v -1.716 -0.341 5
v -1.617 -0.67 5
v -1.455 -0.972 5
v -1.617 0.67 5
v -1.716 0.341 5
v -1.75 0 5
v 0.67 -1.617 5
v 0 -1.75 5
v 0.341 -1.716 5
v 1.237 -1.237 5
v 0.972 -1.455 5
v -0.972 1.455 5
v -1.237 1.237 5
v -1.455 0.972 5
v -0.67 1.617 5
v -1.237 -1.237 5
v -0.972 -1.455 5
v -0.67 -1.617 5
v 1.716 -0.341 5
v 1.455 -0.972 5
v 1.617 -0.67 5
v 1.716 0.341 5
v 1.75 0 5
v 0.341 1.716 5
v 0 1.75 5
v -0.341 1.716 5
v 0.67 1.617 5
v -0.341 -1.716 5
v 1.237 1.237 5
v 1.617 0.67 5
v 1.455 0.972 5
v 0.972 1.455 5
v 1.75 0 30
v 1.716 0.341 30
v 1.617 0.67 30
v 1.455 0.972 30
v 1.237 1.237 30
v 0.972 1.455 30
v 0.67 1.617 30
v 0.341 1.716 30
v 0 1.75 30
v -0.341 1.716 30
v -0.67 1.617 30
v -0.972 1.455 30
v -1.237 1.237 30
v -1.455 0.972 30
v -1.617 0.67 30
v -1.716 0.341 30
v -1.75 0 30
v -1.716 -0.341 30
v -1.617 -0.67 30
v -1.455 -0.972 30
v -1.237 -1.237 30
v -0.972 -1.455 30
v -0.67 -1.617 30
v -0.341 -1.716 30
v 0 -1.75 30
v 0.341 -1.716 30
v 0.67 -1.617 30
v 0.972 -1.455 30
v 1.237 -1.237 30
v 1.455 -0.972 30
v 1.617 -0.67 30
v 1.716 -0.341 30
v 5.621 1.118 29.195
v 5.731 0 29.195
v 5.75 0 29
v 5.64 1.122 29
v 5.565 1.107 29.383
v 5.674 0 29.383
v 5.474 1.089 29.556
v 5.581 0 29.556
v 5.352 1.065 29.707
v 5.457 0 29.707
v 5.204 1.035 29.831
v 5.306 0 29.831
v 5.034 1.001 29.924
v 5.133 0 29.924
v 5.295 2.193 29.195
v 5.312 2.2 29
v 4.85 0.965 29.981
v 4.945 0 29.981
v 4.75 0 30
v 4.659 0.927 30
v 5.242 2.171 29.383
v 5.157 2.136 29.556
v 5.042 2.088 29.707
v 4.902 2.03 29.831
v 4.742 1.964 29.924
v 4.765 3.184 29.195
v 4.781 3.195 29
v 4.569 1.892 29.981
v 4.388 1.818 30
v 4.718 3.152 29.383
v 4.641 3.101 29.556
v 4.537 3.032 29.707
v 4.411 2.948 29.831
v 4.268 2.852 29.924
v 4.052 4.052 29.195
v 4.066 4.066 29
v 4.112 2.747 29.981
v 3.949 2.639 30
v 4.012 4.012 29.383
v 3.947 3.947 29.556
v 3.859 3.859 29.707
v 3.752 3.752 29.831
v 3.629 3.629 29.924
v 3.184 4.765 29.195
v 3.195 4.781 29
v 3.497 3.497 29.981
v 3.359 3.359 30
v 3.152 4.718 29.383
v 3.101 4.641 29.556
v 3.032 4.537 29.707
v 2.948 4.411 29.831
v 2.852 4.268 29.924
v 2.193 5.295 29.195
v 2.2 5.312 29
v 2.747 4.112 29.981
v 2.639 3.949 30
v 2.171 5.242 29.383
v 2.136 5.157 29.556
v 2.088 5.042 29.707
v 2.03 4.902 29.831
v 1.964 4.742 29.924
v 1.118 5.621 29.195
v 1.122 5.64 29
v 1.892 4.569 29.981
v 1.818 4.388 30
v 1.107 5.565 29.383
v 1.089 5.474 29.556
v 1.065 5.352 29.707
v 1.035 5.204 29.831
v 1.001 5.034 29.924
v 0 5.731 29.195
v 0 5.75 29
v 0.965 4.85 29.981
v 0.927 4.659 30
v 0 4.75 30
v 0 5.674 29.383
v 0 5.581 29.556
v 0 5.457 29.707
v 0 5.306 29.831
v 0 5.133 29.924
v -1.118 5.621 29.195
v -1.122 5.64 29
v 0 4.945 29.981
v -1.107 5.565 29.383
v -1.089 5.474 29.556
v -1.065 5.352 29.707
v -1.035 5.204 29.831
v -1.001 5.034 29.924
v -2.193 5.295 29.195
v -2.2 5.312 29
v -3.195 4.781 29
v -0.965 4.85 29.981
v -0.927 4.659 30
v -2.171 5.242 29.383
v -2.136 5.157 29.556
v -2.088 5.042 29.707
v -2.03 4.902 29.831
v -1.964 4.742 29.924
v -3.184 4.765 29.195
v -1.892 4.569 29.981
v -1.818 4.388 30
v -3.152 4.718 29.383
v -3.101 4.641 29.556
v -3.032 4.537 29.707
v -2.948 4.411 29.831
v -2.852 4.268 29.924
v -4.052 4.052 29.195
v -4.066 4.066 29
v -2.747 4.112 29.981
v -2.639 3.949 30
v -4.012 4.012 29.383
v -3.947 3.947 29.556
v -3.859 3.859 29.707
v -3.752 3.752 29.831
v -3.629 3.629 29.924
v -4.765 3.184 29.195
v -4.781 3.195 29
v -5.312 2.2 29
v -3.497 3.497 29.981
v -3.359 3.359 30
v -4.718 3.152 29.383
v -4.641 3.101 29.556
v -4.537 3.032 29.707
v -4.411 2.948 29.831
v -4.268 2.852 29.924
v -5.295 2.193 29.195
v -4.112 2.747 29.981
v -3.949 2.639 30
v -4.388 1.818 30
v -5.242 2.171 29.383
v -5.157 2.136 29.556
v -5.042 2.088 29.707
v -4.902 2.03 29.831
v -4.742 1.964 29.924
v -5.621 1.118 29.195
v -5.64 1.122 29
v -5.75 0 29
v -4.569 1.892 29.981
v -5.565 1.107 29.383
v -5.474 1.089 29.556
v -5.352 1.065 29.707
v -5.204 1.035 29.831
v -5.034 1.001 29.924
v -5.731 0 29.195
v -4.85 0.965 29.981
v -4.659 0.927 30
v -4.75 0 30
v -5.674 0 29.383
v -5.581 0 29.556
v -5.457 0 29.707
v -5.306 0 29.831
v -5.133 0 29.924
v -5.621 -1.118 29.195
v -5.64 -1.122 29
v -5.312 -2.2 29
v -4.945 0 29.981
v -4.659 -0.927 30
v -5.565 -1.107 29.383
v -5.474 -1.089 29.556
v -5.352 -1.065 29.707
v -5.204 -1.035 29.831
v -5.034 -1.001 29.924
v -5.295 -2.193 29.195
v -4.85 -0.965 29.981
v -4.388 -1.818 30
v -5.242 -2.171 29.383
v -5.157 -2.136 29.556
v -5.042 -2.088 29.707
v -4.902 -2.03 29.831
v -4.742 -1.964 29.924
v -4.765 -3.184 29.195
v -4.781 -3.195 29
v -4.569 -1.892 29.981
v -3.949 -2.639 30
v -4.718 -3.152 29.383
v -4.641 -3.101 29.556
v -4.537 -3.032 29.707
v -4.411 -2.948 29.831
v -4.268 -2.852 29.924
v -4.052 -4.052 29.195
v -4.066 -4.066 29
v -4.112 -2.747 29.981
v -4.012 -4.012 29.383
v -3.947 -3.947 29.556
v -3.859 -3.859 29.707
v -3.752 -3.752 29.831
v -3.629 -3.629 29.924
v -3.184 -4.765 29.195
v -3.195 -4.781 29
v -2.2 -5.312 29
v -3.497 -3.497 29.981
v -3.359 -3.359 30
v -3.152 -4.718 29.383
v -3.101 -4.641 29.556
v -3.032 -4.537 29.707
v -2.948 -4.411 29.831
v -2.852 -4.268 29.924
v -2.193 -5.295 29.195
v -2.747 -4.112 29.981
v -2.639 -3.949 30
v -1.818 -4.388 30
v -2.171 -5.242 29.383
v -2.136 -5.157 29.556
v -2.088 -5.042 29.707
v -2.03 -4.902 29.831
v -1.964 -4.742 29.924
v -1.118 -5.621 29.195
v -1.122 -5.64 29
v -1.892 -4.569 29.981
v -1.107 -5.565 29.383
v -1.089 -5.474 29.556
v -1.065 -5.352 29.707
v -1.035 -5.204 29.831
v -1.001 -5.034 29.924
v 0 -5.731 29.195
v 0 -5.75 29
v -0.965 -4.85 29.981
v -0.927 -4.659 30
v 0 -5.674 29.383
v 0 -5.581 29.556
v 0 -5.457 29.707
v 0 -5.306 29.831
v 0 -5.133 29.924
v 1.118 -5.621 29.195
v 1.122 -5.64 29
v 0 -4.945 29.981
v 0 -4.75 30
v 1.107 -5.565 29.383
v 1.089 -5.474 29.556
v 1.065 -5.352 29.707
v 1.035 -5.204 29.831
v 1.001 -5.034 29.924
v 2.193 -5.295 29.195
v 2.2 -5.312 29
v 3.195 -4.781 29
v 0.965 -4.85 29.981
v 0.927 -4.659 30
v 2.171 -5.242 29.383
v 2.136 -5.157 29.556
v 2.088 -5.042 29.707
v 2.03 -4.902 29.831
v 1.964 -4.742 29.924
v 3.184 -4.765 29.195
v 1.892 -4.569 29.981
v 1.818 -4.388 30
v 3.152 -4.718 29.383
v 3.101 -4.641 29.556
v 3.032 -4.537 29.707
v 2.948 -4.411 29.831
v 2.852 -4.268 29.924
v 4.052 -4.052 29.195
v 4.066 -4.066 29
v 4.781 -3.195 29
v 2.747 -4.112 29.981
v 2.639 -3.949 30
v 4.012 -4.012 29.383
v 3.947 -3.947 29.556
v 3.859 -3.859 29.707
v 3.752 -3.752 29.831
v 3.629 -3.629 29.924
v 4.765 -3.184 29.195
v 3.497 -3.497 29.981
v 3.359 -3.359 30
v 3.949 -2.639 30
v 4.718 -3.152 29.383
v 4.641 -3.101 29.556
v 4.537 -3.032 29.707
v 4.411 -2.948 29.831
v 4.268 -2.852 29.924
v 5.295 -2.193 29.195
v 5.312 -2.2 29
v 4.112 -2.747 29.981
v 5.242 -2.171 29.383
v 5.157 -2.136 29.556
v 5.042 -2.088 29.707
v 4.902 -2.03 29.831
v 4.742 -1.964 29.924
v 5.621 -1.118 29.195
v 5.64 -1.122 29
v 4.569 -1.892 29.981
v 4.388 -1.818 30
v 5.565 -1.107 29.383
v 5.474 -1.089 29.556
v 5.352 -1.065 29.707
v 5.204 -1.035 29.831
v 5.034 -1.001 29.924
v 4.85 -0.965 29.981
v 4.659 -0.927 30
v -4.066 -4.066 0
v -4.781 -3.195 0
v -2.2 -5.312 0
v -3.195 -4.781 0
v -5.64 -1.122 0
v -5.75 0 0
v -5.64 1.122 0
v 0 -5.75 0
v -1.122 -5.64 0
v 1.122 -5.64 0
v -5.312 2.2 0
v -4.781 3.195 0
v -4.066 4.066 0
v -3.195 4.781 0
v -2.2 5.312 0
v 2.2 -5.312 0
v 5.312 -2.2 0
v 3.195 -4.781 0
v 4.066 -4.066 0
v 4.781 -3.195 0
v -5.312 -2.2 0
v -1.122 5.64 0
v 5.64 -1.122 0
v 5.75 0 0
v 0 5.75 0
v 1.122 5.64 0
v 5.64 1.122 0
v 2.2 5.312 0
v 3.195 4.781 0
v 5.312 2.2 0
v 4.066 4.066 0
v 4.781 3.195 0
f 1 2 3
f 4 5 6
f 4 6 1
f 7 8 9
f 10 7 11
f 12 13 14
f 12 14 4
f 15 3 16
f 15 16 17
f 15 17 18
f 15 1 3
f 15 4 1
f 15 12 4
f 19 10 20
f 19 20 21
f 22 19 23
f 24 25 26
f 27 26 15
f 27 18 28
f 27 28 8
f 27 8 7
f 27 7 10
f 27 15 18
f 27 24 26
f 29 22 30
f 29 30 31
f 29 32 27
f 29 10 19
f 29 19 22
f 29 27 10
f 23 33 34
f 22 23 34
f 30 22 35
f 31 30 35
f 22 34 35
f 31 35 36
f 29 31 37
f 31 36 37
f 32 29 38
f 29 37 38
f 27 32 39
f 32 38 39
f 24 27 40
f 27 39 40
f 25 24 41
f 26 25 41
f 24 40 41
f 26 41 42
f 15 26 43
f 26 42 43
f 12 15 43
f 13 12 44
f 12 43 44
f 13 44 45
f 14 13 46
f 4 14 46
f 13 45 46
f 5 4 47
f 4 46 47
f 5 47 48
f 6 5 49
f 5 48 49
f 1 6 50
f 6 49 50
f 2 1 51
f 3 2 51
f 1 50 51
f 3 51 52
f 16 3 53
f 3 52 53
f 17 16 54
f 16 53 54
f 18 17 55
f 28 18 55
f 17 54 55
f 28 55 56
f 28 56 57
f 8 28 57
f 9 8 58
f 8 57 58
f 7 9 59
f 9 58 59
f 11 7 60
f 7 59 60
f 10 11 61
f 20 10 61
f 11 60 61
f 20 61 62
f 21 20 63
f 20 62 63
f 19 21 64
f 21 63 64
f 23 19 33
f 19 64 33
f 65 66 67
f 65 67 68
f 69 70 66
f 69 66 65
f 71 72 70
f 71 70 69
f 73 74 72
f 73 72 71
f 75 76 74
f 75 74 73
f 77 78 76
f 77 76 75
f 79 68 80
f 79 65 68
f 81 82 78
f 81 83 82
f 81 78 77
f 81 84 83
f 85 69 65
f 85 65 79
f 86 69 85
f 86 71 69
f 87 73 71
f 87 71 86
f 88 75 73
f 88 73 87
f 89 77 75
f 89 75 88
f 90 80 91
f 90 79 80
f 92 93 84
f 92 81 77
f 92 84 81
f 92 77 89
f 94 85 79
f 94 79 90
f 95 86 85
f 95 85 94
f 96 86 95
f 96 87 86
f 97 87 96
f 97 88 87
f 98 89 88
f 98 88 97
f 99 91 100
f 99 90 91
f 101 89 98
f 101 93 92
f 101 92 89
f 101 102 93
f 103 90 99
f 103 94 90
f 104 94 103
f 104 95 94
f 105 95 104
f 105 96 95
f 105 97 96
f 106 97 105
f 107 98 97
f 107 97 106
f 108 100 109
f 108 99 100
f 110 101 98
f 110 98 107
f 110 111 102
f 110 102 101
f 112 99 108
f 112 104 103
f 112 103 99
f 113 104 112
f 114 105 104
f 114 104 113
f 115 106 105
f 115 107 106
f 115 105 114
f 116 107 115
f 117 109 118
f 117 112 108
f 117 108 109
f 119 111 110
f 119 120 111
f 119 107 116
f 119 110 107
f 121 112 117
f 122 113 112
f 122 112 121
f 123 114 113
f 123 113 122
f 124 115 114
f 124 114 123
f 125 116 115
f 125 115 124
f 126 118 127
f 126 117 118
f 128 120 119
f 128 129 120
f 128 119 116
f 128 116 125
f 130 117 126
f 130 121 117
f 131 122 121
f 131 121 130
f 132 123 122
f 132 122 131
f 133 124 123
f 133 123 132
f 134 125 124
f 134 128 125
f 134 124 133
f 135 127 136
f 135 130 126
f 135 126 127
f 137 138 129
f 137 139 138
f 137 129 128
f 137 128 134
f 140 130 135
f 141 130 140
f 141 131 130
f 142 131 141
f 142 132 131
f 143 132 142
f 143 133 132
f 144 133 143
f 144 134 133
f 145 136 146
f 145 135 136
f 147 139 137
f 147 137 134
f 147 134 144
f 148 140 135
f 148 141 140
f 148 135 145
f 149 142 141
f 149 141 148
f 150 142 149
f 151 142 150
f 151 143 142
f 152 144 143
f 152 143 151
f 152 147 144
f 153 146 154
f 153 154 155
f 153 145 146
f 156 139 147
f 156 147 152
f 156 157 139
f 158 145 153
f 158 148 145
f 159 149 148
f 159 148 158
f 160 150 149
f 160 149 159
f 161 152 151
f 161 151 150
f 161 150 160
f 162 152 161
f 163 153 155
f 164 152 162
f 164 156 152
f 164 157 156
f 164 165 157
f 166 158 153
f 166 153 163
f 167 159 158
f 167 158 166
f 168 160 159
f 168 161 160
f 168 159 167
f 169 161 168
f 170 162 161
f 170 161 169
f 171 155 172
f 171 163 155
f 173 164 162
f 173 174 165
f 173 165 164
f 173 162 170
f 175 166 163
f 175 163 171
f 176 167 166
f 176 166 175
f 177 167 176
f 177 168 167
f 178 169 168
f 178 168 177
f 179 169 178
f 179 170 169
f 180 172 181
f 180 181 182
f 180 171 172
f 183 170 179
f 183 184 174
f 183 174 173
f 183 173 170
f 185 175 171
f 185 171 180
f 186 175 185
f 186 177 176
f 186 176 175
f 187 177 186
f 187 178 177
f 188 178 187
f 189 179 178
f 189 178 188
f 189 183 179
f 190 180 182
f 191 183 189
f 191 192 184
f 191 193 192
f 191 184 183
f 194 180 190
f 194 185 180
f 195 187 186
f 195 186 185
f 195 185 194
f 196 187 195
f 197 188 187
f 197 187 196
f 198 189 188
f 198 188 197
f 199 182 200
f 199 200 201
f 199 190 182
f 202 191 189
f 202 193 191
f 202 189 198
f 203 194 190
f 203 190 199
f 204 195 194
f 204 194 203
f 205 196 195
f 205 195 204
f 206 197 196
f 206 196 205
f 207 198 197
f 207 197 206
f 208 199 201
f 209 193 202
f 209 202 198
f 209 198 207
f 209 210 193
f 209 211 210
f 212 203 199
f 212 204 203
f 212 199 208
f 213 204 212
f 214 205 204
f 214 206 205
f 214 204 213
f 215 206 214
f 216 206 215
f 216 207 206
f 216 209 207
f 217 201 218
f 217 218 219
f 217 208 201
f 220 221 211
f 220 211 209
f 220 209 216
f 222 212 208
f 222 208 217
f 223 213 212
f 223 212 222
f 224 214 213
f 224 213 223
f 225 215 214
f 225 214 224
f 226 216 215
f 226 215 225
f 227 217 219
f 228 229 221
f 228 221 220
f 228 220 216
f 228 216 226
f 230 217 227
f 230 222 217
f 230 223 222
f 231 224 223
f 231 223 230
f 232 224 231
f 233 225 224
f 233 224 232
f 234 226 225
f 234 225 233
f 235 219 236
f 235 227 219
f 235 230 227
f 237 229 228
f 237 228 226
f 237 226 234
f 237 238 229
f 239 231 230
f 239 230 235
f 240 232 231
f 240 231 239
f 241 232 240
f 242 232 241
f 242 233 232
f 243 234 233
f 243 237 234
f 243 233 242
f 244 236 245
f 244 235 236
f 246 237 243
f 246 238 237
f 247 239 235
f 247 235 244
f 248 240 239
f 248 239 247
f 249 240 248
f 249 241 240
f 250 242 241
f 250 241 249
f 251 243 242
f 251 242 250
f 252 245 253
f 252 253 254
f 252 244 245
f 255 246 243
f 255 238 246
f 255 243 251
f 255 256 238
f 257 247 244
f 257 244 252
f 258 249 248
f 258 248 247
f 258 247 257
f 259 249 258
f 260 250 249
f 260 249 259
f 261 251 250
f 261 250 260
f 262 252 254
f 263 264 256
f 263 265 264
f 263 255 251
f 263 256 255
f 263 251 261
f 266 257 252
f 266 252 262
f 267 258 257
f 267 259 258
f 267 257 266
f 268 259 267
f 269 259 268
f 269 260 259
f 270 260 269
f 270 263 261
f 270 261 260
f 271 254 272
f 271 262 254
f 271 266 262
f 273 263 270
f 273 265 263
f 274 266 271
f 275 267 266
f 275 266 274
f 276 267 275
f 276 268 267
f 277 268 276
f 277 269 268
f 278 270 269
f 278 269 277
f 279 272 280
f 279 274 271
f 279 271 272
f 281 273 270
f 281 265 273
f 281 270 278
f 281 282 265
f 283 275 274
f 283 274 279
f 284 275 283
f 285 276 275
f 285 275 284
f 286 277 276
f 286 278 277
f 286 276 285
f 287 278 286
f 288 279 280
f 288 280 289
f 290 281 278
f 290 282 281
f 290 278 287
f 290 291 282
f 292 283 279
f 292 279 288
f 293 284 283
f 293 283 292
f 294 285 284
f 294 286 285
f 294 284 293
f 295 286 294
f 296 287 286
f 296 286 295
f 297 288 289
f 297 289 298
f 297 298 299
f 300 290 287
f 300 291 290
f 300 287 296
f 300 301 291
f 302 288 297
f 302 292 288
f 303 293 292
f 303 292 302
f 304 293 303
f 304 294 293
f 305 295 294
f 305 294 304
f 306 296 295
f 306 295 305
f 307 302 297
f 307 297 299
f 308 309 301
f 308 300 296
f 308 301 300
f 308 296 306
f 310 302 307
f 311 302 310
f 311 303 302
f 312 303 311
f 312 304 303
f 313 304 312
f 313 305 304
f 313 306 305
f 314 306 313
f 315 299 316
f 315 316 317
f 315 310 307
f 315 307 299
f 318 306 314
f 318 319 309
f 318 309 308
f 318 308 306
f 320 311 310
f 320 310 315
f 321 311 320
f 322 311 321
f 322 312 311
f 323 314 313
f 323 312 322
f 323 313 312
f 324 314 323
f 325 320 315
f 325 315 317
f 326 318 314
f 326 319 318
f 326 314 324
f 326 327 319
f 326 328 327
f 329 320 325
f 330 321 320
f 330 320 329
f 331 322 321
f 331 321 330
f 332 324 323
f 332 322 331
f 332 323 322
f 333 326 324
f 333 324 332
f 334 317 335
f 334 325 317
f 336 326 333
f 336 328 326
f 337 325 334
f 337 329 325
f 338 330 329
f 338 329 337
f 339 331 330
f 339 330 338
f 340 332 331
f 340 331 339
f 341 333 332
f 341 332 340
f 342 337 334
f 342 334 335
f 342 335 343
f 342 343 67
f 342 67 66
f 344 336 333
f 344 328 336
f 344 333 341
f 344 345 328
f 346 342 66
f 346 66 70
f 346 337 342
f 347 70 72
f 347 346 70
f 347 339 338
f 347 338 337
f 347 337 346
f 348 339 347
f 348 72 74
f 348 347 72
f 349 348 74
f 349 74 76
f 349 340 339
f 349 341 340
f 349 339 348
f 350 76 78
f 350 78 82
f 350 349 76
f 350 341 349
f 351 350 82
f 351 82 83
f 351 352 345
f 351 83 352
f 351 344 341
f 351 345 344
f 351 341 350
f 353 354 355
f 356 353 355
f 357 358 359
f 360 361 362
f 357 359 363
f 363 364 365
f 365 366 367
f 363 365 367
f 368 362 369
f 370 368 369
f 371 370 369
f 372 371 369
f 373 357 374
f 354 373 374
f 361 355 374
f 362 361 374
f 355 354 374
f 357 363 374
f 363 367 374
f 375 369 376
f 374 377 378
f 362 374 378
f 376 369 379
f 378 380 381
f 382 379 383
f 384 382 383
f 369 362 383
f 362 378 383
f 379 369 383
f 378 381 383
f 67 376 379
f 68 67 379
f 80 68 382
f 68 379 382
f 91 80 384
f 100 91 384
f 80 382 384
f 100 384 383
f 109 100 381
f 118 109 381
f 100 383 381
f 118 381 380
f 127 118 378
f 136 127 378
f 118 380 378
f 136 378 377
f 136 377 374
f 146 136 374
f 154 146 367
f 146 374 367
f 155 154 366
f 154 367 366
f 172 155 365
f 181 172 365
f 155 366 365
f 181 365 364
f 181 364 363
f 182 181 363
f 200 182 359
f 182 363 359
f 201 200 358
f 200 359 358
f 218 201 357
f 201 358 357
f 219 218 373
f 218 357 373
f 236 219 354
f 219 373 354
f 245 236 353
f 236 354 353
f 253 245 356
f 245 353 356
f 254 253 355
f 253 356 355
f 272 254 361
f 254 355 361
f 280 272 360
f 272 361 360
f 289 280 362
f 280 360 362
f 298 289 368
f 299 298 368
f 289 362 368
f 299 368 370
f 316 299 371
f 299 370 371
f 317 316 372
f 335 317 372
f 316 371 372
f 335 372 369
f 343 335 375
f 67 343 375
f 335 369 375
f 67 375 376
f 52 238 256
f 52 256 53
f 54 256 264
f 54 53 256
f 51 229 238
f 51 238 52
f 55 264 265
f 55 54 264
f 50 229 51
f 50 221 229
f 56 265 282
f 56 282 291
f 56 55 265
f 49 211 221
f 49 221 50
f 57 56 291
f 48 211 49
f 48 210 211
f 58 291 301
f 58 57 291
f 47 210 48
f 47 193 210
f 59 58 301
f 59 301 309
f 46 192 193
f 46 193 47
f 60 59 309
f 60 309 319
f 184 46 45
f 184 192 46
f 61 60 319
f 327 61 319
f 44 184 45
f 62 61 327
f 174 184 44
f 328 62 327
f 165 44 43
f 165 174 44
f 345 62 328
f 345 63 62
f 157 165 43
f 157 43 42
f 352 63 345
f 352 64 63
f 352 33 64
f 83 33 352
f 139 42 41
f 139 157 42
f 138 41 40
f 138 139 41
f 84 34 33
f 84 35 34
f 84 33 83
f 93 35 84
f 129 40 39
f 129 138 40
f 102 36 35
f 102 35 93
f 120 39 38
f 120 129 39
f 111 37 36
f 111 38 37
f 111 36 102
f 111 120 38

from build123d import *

# Parameters (mm, degrees)
F0_R     = 5.75
F1_DEPTH = 30
F2_R     = 1.75
F3_DEPTH = 25
F4_R     = 1


with BuildPart() as f1:
    # F0 (on Top) → F1 (new body)
    with BuildSketch(Plane.XY):
        Circle(F0_R)
    extrude(amount=F1_DEPTH)

    # F2 (on face) → F3 (cut)
    with BuildSketch(Plane.XY.offset(30)):
        Circle(F2_R)
    extrude(amount=-F3_DEPTH, mode=Mode.SUBTRACT)

    # F4
    f4_edges = [f1.edges().sort_by_distance(p)[0] for p in [
        (-5.75, 0, 30),
    ]]
    fillet(f4_edges, radius=F4_R)


solid = f1.part
